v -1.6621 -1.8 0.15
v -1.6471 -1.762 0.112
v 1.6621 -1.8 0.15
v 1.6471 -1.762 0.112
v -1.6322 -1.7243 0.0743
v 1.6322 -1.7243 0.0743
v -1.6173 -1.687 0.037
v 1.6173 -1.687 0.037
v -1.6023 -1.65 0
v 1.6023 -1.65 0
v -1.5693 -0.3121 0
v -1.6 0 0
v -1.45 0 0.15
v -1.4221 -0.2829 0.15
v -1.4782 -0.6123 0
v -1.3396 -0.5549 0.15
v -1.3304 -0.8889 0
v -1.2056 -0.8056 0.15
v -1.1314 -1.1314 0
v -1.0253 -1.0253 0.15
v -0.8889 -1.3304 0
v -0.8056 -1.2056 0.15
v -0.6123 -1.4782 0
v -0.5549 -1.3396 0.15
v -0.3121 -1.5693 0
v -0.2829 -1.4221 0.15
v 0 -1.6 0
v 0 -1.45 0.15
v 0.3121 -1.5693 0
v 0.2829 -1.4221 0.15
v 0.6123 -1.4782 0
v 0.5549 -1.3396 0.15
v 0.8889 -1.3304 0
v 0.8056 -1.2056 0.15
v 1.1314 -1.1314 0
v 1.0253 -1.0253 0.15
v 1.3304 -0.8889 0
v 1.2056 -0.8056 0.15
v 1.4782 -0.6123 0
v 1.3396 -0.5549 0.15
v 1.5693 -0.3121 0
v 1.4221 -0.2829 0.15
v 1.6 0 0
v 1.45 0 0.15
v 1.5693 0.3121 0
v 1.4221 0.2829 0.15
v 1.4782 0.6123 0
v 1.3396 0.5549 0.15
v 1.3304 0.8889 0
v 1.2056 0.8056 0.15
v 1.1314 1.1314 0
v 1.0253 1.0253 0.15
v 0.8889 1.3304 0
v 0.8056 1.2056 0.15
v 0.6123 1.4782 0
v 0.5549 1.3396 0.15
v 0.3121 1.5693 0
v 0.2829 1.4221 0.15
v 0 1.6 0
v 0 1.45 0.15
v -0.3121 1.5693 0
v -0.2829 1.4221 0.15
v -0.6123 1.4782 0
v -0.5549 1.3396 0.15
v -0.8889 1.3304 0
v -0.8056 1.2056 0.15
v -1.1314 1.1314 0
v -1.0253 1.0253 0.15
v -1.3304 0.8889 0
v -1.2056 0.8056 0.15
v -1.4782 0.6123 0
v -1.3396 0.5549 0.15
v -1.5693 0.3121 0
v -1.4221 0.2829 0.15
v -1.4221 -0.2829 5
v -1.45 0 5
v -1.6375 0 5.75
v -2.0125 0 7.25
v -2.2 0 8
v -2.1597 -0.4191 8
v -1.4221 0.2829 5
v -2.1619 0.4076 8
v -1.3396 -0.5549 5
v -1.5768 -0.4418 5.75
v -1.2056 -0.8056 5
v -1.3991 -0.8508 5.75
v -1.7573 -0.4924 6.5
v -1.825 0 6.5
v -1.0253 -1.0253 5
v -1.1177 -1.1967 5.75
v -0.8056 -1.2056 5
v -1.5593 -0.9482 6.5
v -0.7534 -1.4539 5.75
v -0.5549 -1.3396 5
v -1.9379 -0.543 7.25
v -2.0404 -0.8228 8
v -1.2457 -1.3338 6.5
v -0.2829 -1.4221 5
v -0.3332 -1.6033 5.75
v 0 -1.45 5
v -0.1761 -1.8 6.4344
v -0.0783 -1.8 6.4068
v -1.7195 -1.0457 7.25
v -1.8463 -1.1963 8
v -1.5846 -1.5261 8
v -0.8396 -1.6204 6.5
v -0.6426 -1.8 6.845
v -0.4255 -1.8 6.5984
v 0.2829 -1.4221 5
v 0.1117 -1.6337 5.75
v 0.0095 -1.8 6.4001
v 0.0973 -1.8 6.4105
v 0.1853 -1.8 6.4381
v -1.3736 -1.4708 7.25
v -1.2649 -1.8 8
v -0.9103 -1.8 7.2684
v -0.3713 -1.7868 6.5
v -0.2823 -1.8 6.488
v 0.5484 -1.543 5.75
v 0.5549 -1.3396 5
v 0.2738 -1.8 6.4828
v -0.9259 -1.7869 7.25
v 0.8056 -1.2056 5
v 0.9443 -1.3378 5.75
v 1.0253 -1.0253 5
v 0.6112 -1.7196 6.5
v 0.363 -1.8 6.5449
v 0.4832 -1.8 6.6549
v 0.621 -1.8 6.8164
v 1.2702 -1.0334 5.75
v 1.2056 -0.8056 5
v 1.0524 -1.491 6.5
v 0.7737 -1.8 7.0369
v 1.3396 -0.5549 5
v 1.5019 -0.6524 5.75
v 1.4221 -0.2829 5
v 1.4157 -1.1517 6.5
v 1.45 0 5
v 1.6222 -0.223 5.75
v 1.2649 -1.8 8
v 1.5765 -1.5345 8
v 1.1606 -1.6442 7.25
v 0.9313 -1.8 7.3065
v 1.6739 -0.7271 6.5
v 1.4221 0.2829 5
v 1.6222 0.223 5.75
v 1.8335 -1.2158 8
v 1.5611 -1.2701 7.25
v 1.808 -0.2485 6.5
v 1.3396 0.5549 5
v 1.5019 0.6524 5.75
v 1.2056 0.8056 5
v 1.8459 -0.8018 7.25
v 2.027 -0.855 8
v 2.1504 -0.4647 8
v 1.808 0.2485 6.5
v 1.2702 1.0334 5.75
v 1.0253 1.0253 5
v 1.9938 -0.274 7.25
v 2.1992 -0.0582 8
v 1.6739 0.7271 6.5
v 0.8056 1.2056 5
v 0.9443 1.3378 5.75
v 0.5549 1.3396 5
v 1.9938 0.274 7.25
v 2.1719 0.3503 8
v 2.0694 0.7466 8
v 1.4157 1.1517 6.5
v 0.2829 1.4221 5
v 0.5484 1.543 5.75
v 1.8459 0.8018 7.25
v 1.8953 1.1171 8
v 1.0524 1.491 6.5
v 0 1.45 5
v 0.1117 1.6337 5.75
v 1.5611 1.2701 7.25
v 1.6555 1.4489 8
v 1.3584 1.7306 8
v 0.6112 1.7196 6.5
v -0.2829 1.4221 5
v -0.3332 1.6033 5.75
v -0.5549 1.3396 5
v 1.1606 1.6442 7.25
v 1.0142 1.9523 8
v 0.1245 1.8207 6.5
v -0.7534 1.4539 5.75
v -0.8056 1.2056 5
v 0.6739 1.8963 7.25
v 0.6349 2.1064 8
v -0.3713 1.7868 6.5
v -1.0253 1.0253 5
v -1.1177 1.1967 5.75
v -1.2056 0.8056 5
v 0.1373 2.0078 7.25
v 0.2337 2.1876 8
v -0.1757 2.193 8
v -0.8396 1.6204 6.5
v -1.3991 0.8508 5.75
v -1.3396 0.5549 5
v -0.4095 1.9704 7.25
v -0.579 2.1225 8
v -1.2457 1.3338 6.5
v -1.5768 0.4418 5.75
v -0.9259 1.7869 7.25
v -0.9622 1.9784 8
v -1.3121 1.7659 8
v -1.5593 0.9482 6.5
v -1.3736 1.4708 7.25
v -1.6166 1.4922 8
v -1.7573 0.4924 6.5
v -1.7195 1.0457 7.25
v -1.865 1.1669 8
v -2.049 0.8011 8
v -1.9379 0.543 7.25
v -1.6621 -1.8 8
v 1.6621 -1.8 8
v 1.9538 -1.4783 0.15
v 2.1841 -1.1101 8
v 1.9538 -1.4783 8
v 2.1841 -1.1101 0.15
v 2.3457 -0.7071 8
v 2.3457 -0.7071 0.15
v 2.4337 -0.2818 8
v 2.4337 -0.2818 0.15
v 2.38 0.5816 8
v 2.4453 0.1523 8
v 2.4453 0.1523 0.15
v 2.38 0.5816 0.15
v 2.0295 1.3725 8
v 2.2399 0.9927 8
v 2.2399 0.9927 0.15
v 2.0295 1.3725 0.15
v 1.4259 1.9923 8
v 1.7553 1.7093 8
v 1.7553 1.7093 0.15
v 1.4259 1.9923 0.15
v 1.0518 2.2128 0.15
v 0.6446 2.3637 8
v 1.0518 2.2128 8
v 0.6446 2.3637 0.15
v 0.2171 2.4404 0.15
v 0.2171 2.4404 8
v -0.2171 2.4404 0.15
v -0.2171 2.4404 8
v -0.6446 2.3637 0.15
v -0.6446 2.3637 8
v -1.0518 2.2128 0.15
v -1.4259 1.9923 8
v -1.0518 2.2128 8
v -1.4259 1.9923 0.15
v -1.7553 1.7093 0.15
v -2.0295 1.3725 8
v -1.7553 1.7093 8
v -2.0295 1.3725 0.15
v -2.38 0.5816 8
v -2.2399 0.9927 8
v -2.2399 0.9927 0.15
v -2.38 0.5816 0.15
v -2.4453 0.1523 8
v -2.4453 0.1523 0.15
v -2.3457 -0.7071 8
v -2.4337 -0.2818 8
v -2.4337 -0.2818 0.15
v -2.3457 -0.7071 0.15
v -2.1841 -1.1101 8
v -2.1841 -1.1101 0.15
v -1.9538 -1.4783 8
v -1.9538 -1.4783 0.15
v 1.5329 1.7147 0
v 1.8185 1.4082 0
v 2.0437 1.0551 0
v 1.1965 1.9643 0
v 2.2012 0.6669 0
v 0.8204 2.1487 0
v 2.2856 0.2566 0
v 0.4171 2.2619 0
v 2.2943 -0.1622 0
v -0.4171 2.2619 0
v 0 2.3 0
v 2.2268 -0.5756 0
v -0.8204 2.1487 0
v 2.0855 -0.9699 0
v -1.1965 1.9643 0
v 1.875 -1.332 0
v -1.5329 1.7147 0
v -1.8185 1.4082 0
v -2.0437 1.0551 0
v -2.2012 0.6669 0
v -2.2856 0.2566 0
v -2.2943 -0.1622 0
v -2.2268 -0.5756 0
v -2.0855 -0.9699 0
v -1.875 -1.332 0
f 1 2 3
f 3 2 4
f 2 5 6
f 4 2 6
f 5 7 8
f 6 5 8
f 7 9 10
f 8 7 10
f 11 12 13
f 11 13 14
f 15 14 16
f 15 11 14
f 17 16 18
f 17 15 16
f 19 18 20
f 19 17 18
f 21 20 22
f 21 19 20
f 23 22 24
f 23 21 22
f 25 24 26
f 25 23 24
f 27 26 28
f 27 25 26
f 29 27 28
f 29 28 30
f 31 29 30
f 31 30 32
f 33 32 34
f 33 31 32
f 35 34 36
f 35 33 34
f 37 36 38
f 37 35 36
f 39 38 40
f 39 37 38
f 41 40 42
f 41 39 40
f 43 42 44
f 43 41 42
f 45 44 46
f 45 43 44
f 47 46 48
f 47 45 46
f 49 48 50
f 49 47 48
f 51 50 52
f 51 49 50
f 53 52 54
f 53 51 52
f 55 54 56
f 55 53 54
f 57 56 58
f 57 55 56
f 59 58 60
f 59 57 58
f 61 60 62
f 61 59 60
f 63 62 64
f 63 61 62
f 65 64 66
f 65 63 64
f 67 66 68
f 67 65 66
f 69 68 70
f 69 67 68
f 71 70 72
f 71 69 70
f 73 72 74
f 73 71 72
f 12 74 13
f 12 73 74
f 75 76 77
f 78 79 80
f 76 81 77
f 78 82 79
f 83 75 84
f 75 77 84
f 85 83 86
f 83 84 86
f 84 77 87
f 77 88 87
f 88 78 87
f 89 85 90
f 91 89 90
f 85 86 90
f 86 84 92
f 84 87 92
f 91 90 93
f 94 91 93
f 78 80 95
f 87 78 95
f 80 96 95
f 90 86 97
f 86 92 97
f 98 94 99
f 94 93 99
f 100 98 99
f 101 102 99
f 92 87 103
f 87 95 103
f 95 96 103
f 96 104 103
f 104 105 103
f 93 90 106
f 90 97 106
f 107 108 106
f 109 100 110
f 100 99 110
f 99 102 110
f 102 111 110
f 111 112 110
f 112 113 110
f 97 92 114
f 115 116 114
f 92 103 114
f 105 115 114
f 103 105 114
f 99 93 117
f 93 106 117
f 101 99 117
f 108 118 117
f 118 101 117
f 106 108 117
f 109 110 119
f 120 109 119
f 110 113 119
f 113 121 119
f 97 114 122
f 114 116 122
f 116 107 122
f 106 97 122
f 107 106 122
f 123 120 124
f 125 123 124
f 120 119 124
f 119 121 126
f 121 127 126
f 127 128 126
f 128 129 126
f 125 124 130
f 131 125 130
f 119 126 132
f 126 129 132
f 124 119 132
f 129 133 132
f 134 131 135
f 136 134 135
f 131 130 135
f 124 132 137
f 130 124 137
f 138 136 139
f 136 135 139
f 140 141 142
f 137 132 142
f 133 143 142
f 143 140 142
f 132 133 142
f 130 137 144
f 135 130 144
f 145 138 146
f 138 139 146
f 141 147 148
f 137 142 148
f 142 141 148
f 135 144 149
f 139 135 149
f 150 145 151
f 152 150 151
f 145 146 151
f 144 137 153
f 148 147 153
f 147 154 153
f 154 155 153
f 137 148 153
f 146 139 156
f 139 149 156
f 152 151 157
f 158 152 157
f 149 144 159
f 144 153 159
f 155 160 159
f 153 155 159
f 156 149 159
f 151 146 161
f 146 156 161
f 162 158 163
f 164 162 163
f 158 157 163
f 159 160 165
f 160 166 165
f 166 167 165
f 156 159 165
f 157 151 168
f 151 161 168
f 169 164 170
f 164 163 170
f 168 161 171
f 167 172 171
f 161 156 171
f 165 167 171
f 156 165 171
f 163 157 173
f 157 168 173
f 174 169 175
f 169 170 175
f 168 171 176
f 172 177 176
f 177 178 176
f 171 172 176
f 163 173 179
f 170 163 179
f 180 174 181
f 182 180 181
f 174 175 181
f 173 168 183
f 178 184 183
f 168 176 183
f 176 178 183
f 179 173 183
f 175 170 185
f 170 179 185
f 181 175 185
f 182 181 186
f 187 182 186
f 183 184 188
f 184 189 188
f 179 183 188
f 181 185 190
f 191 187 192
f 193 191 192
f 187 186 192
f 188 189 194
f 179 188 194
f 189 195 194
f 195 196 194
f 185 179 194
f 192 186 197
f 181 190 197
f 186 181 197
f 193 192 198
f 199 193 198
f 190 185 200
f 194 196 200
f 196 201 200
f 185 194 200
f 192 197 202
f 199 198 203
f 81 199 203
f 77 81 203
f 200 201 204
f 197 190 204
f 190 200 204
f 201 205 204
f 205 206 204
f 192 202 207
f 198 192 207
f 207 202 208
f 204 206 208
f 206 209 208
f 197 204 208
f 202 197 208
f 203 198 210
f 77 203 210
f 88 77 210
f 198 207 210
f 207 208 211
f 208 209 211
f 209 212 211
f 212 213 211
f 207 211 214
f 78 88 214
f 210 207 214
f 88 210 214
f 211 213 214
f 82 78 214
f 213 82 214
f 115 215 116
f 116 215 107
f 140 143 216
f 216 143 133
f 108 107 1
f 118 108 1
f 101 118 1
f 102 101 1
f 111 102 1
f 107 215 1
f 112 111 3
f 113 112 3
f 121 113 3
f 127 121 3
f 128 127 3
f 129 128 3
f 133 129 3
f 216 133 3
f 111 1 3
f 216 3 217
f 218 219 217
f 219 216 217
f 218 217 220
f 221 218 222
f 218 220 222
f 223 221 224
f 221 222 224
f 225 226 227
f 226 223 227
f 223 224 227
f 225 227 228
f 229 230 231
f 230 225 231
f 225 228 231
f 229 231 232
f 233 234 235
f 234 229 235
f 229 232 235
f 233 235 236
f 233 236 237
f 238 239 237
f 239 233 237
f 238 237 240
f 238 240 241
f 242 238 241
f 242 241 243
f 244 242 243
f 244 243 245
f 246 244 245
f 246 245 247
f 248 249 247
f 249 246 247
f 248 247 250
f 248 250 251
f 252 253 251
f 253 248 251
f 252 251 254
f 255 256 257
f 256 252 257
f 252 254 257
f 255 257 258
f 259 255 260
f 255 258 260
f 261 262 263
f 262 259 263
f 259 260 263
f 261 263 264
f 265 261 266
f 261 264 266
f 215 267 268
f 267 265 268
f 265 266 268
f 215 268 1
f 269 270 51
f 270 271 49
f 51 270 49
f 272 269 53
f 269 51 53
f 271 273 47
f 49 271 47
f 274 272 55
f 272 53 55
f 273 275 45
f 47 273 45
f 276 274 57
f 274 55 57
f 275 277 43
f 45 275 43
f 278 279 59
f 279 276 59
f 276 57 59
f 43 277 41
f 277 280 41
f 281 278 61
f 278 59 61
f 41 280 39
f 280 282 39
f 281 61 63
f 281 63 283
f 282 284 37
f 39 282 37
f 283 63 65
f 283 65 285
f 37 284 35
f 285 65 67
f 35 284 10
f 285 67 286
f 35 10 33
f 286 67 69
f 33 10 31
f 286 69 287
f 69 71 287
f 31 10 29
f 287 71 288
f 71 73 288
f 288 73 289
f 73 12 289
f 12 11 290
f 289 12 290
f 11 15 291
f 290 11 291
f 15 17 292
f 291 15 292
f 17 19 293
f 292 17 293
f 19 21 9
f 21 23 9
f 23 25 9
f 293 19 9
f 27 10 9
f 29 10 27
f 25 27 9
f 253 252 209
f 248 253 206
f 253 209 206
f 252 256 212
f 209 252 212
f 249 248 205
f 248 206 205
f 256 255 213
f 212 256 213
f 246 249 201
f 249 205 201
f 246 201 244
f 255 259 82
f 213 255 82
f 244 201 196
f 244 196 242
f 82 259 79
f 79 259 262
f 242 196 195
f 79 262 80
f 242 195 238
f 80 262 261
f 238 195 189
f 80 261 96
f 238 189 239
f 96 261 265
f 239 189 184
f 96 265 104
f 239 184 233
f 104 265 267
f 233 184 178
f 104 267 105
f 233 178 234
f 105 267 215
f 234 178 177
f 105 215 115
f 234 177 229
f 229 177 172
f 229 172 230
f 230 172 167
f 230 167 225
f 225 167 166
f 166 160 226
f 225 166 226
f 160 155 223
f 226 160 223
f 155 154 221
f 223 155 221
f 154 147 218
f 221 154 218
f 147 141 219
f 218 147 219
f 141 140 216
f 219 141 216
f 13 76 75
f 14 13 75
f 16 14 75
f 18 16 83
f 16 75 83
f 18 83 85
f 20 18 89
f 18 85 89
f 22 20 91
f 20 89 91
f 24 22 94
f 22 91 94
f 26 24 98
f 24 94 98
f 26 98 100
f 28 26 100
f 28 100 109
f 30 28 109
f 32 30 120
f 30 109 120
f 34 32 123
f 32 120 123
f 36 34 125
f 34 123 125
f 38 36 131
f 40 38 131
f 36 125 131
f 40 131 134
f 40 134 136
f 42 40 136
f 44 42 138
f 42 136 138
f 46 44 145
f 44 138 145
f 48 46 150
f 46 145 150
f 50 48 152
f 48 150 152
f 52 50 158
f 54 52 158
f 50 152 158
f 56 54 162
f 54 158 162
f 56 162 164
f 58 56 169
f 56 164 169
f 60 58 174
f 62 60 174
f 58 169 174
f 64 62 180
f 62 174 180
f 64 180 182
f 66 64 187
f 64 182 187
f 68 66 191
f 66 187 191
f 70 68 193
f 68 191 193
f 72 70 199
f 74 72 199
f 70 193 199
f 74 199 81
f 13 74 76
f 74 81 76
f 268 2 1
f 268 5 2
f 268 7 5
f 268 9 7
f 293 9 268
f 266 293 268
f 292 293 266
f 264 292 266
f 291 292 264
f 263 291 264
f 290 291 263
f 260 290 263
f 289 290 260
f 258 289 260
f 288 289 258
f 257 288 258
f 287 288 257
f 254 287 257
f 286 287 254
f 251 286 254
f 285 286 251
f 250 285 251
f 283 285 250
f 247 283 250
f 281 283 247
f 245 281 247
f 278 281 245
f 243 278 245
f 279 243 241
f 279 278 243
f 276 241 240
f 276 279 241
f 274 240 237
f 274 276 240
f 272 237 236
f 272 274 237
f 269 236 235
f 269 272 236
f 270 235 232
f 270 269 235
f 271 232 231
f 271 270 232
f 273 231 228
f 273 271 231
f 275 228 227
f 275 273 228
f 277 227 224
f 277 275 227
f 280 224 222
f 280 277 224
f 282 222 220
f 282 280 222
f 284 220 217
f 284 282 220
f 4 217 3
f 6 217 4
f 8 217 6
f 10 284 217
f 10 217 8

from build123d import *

# Parameters (mm, degrees)
SKETCH012_W     = 4.485072
SKETCH012_H     = 0.815651
POCKET003_DEPTH = 8.001
CHAMFER003_SIZE = 0.15


with BuildPart() as part:
    # Sketch011 → Revolution001 (revolve)
    with BuildSketch(Plane.XZ):
        Polygon((-1.45, 0), (-1.45, 5), (-2.2, 8), (-2.45, 8), (-2.45, 0), align=None)
    revolve(axis=Axis((0, 0, 0), (0, 0, 1)))

    # Sketch012 (on Face5 of Revolution001) → Pocket003 (cut, through all)
    with BuildSketch(Plane(origin=(0, 0, 0), x_dir=(1, 0, 0), z_dir=(0, 0, -1))):
        with Locations((0.20817, 2.2078255)):
            Rectangle(SKETCH012_W, SKETCH012_H)
    extrude(amount=-POCKET003_DEPTH, mode=Mode.SUBTRACT)

    # Chamfer003
    chamfer003_edges = [part.edges().sort_by_distance(p)[0] for p in [
        (-2.244392, -0.982449, 0),
        (0, -1.8, 0),
        (0.982449, 2.244392, 0),
        (1.45, 0, 0),
    ]]
    chamfer(chamfer003_edges, length=CHAMFER003_SIZE)


solid = part.part
